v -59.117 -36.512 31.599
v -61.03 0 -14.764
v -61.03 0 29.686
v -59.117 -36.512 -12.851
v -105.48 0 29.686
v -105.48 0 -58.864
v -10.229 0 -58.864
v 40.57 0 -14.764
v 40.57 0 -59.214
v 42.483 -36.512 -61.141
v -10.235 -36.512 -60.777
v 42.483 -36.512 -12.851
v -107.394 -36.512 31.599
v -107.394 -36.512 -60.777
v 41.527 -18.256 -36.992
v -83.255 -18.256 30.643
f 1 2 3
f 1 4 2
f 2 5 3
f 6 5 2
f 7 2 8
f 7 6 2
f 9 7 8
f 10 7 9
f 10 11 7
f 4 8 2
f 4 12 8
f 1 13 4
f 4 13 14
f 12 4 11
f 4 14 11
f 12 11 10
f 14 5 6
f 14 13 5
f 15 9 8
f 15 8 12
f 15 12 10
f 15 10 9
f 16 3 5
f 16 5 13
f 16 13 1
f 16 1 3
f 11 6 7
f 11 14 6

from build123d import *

# Parameters (mm, degrees)
F1_DEPTH = 36.5125
F1_TAPER = -3


with BuildPart() as f1:
    # F0 (on Front) → F1 (new body)
    with BuildSketch(Plane.XZ):
        Polygon((-61.0300807763, 29.6859250018), (-105.4800807763, 29.6859250018), (-105.4800807763, -58.8637311338), (-10.228872683, -58.8637311338), (40.5699192237, -59.2140749982), (40.5699192237, -14.7640749982), (-61.0300807763, -14.7640749982), align=None)
    extrude(amount=F1_DEPTH, taper=F1_TAPER)


solid = f1.part
